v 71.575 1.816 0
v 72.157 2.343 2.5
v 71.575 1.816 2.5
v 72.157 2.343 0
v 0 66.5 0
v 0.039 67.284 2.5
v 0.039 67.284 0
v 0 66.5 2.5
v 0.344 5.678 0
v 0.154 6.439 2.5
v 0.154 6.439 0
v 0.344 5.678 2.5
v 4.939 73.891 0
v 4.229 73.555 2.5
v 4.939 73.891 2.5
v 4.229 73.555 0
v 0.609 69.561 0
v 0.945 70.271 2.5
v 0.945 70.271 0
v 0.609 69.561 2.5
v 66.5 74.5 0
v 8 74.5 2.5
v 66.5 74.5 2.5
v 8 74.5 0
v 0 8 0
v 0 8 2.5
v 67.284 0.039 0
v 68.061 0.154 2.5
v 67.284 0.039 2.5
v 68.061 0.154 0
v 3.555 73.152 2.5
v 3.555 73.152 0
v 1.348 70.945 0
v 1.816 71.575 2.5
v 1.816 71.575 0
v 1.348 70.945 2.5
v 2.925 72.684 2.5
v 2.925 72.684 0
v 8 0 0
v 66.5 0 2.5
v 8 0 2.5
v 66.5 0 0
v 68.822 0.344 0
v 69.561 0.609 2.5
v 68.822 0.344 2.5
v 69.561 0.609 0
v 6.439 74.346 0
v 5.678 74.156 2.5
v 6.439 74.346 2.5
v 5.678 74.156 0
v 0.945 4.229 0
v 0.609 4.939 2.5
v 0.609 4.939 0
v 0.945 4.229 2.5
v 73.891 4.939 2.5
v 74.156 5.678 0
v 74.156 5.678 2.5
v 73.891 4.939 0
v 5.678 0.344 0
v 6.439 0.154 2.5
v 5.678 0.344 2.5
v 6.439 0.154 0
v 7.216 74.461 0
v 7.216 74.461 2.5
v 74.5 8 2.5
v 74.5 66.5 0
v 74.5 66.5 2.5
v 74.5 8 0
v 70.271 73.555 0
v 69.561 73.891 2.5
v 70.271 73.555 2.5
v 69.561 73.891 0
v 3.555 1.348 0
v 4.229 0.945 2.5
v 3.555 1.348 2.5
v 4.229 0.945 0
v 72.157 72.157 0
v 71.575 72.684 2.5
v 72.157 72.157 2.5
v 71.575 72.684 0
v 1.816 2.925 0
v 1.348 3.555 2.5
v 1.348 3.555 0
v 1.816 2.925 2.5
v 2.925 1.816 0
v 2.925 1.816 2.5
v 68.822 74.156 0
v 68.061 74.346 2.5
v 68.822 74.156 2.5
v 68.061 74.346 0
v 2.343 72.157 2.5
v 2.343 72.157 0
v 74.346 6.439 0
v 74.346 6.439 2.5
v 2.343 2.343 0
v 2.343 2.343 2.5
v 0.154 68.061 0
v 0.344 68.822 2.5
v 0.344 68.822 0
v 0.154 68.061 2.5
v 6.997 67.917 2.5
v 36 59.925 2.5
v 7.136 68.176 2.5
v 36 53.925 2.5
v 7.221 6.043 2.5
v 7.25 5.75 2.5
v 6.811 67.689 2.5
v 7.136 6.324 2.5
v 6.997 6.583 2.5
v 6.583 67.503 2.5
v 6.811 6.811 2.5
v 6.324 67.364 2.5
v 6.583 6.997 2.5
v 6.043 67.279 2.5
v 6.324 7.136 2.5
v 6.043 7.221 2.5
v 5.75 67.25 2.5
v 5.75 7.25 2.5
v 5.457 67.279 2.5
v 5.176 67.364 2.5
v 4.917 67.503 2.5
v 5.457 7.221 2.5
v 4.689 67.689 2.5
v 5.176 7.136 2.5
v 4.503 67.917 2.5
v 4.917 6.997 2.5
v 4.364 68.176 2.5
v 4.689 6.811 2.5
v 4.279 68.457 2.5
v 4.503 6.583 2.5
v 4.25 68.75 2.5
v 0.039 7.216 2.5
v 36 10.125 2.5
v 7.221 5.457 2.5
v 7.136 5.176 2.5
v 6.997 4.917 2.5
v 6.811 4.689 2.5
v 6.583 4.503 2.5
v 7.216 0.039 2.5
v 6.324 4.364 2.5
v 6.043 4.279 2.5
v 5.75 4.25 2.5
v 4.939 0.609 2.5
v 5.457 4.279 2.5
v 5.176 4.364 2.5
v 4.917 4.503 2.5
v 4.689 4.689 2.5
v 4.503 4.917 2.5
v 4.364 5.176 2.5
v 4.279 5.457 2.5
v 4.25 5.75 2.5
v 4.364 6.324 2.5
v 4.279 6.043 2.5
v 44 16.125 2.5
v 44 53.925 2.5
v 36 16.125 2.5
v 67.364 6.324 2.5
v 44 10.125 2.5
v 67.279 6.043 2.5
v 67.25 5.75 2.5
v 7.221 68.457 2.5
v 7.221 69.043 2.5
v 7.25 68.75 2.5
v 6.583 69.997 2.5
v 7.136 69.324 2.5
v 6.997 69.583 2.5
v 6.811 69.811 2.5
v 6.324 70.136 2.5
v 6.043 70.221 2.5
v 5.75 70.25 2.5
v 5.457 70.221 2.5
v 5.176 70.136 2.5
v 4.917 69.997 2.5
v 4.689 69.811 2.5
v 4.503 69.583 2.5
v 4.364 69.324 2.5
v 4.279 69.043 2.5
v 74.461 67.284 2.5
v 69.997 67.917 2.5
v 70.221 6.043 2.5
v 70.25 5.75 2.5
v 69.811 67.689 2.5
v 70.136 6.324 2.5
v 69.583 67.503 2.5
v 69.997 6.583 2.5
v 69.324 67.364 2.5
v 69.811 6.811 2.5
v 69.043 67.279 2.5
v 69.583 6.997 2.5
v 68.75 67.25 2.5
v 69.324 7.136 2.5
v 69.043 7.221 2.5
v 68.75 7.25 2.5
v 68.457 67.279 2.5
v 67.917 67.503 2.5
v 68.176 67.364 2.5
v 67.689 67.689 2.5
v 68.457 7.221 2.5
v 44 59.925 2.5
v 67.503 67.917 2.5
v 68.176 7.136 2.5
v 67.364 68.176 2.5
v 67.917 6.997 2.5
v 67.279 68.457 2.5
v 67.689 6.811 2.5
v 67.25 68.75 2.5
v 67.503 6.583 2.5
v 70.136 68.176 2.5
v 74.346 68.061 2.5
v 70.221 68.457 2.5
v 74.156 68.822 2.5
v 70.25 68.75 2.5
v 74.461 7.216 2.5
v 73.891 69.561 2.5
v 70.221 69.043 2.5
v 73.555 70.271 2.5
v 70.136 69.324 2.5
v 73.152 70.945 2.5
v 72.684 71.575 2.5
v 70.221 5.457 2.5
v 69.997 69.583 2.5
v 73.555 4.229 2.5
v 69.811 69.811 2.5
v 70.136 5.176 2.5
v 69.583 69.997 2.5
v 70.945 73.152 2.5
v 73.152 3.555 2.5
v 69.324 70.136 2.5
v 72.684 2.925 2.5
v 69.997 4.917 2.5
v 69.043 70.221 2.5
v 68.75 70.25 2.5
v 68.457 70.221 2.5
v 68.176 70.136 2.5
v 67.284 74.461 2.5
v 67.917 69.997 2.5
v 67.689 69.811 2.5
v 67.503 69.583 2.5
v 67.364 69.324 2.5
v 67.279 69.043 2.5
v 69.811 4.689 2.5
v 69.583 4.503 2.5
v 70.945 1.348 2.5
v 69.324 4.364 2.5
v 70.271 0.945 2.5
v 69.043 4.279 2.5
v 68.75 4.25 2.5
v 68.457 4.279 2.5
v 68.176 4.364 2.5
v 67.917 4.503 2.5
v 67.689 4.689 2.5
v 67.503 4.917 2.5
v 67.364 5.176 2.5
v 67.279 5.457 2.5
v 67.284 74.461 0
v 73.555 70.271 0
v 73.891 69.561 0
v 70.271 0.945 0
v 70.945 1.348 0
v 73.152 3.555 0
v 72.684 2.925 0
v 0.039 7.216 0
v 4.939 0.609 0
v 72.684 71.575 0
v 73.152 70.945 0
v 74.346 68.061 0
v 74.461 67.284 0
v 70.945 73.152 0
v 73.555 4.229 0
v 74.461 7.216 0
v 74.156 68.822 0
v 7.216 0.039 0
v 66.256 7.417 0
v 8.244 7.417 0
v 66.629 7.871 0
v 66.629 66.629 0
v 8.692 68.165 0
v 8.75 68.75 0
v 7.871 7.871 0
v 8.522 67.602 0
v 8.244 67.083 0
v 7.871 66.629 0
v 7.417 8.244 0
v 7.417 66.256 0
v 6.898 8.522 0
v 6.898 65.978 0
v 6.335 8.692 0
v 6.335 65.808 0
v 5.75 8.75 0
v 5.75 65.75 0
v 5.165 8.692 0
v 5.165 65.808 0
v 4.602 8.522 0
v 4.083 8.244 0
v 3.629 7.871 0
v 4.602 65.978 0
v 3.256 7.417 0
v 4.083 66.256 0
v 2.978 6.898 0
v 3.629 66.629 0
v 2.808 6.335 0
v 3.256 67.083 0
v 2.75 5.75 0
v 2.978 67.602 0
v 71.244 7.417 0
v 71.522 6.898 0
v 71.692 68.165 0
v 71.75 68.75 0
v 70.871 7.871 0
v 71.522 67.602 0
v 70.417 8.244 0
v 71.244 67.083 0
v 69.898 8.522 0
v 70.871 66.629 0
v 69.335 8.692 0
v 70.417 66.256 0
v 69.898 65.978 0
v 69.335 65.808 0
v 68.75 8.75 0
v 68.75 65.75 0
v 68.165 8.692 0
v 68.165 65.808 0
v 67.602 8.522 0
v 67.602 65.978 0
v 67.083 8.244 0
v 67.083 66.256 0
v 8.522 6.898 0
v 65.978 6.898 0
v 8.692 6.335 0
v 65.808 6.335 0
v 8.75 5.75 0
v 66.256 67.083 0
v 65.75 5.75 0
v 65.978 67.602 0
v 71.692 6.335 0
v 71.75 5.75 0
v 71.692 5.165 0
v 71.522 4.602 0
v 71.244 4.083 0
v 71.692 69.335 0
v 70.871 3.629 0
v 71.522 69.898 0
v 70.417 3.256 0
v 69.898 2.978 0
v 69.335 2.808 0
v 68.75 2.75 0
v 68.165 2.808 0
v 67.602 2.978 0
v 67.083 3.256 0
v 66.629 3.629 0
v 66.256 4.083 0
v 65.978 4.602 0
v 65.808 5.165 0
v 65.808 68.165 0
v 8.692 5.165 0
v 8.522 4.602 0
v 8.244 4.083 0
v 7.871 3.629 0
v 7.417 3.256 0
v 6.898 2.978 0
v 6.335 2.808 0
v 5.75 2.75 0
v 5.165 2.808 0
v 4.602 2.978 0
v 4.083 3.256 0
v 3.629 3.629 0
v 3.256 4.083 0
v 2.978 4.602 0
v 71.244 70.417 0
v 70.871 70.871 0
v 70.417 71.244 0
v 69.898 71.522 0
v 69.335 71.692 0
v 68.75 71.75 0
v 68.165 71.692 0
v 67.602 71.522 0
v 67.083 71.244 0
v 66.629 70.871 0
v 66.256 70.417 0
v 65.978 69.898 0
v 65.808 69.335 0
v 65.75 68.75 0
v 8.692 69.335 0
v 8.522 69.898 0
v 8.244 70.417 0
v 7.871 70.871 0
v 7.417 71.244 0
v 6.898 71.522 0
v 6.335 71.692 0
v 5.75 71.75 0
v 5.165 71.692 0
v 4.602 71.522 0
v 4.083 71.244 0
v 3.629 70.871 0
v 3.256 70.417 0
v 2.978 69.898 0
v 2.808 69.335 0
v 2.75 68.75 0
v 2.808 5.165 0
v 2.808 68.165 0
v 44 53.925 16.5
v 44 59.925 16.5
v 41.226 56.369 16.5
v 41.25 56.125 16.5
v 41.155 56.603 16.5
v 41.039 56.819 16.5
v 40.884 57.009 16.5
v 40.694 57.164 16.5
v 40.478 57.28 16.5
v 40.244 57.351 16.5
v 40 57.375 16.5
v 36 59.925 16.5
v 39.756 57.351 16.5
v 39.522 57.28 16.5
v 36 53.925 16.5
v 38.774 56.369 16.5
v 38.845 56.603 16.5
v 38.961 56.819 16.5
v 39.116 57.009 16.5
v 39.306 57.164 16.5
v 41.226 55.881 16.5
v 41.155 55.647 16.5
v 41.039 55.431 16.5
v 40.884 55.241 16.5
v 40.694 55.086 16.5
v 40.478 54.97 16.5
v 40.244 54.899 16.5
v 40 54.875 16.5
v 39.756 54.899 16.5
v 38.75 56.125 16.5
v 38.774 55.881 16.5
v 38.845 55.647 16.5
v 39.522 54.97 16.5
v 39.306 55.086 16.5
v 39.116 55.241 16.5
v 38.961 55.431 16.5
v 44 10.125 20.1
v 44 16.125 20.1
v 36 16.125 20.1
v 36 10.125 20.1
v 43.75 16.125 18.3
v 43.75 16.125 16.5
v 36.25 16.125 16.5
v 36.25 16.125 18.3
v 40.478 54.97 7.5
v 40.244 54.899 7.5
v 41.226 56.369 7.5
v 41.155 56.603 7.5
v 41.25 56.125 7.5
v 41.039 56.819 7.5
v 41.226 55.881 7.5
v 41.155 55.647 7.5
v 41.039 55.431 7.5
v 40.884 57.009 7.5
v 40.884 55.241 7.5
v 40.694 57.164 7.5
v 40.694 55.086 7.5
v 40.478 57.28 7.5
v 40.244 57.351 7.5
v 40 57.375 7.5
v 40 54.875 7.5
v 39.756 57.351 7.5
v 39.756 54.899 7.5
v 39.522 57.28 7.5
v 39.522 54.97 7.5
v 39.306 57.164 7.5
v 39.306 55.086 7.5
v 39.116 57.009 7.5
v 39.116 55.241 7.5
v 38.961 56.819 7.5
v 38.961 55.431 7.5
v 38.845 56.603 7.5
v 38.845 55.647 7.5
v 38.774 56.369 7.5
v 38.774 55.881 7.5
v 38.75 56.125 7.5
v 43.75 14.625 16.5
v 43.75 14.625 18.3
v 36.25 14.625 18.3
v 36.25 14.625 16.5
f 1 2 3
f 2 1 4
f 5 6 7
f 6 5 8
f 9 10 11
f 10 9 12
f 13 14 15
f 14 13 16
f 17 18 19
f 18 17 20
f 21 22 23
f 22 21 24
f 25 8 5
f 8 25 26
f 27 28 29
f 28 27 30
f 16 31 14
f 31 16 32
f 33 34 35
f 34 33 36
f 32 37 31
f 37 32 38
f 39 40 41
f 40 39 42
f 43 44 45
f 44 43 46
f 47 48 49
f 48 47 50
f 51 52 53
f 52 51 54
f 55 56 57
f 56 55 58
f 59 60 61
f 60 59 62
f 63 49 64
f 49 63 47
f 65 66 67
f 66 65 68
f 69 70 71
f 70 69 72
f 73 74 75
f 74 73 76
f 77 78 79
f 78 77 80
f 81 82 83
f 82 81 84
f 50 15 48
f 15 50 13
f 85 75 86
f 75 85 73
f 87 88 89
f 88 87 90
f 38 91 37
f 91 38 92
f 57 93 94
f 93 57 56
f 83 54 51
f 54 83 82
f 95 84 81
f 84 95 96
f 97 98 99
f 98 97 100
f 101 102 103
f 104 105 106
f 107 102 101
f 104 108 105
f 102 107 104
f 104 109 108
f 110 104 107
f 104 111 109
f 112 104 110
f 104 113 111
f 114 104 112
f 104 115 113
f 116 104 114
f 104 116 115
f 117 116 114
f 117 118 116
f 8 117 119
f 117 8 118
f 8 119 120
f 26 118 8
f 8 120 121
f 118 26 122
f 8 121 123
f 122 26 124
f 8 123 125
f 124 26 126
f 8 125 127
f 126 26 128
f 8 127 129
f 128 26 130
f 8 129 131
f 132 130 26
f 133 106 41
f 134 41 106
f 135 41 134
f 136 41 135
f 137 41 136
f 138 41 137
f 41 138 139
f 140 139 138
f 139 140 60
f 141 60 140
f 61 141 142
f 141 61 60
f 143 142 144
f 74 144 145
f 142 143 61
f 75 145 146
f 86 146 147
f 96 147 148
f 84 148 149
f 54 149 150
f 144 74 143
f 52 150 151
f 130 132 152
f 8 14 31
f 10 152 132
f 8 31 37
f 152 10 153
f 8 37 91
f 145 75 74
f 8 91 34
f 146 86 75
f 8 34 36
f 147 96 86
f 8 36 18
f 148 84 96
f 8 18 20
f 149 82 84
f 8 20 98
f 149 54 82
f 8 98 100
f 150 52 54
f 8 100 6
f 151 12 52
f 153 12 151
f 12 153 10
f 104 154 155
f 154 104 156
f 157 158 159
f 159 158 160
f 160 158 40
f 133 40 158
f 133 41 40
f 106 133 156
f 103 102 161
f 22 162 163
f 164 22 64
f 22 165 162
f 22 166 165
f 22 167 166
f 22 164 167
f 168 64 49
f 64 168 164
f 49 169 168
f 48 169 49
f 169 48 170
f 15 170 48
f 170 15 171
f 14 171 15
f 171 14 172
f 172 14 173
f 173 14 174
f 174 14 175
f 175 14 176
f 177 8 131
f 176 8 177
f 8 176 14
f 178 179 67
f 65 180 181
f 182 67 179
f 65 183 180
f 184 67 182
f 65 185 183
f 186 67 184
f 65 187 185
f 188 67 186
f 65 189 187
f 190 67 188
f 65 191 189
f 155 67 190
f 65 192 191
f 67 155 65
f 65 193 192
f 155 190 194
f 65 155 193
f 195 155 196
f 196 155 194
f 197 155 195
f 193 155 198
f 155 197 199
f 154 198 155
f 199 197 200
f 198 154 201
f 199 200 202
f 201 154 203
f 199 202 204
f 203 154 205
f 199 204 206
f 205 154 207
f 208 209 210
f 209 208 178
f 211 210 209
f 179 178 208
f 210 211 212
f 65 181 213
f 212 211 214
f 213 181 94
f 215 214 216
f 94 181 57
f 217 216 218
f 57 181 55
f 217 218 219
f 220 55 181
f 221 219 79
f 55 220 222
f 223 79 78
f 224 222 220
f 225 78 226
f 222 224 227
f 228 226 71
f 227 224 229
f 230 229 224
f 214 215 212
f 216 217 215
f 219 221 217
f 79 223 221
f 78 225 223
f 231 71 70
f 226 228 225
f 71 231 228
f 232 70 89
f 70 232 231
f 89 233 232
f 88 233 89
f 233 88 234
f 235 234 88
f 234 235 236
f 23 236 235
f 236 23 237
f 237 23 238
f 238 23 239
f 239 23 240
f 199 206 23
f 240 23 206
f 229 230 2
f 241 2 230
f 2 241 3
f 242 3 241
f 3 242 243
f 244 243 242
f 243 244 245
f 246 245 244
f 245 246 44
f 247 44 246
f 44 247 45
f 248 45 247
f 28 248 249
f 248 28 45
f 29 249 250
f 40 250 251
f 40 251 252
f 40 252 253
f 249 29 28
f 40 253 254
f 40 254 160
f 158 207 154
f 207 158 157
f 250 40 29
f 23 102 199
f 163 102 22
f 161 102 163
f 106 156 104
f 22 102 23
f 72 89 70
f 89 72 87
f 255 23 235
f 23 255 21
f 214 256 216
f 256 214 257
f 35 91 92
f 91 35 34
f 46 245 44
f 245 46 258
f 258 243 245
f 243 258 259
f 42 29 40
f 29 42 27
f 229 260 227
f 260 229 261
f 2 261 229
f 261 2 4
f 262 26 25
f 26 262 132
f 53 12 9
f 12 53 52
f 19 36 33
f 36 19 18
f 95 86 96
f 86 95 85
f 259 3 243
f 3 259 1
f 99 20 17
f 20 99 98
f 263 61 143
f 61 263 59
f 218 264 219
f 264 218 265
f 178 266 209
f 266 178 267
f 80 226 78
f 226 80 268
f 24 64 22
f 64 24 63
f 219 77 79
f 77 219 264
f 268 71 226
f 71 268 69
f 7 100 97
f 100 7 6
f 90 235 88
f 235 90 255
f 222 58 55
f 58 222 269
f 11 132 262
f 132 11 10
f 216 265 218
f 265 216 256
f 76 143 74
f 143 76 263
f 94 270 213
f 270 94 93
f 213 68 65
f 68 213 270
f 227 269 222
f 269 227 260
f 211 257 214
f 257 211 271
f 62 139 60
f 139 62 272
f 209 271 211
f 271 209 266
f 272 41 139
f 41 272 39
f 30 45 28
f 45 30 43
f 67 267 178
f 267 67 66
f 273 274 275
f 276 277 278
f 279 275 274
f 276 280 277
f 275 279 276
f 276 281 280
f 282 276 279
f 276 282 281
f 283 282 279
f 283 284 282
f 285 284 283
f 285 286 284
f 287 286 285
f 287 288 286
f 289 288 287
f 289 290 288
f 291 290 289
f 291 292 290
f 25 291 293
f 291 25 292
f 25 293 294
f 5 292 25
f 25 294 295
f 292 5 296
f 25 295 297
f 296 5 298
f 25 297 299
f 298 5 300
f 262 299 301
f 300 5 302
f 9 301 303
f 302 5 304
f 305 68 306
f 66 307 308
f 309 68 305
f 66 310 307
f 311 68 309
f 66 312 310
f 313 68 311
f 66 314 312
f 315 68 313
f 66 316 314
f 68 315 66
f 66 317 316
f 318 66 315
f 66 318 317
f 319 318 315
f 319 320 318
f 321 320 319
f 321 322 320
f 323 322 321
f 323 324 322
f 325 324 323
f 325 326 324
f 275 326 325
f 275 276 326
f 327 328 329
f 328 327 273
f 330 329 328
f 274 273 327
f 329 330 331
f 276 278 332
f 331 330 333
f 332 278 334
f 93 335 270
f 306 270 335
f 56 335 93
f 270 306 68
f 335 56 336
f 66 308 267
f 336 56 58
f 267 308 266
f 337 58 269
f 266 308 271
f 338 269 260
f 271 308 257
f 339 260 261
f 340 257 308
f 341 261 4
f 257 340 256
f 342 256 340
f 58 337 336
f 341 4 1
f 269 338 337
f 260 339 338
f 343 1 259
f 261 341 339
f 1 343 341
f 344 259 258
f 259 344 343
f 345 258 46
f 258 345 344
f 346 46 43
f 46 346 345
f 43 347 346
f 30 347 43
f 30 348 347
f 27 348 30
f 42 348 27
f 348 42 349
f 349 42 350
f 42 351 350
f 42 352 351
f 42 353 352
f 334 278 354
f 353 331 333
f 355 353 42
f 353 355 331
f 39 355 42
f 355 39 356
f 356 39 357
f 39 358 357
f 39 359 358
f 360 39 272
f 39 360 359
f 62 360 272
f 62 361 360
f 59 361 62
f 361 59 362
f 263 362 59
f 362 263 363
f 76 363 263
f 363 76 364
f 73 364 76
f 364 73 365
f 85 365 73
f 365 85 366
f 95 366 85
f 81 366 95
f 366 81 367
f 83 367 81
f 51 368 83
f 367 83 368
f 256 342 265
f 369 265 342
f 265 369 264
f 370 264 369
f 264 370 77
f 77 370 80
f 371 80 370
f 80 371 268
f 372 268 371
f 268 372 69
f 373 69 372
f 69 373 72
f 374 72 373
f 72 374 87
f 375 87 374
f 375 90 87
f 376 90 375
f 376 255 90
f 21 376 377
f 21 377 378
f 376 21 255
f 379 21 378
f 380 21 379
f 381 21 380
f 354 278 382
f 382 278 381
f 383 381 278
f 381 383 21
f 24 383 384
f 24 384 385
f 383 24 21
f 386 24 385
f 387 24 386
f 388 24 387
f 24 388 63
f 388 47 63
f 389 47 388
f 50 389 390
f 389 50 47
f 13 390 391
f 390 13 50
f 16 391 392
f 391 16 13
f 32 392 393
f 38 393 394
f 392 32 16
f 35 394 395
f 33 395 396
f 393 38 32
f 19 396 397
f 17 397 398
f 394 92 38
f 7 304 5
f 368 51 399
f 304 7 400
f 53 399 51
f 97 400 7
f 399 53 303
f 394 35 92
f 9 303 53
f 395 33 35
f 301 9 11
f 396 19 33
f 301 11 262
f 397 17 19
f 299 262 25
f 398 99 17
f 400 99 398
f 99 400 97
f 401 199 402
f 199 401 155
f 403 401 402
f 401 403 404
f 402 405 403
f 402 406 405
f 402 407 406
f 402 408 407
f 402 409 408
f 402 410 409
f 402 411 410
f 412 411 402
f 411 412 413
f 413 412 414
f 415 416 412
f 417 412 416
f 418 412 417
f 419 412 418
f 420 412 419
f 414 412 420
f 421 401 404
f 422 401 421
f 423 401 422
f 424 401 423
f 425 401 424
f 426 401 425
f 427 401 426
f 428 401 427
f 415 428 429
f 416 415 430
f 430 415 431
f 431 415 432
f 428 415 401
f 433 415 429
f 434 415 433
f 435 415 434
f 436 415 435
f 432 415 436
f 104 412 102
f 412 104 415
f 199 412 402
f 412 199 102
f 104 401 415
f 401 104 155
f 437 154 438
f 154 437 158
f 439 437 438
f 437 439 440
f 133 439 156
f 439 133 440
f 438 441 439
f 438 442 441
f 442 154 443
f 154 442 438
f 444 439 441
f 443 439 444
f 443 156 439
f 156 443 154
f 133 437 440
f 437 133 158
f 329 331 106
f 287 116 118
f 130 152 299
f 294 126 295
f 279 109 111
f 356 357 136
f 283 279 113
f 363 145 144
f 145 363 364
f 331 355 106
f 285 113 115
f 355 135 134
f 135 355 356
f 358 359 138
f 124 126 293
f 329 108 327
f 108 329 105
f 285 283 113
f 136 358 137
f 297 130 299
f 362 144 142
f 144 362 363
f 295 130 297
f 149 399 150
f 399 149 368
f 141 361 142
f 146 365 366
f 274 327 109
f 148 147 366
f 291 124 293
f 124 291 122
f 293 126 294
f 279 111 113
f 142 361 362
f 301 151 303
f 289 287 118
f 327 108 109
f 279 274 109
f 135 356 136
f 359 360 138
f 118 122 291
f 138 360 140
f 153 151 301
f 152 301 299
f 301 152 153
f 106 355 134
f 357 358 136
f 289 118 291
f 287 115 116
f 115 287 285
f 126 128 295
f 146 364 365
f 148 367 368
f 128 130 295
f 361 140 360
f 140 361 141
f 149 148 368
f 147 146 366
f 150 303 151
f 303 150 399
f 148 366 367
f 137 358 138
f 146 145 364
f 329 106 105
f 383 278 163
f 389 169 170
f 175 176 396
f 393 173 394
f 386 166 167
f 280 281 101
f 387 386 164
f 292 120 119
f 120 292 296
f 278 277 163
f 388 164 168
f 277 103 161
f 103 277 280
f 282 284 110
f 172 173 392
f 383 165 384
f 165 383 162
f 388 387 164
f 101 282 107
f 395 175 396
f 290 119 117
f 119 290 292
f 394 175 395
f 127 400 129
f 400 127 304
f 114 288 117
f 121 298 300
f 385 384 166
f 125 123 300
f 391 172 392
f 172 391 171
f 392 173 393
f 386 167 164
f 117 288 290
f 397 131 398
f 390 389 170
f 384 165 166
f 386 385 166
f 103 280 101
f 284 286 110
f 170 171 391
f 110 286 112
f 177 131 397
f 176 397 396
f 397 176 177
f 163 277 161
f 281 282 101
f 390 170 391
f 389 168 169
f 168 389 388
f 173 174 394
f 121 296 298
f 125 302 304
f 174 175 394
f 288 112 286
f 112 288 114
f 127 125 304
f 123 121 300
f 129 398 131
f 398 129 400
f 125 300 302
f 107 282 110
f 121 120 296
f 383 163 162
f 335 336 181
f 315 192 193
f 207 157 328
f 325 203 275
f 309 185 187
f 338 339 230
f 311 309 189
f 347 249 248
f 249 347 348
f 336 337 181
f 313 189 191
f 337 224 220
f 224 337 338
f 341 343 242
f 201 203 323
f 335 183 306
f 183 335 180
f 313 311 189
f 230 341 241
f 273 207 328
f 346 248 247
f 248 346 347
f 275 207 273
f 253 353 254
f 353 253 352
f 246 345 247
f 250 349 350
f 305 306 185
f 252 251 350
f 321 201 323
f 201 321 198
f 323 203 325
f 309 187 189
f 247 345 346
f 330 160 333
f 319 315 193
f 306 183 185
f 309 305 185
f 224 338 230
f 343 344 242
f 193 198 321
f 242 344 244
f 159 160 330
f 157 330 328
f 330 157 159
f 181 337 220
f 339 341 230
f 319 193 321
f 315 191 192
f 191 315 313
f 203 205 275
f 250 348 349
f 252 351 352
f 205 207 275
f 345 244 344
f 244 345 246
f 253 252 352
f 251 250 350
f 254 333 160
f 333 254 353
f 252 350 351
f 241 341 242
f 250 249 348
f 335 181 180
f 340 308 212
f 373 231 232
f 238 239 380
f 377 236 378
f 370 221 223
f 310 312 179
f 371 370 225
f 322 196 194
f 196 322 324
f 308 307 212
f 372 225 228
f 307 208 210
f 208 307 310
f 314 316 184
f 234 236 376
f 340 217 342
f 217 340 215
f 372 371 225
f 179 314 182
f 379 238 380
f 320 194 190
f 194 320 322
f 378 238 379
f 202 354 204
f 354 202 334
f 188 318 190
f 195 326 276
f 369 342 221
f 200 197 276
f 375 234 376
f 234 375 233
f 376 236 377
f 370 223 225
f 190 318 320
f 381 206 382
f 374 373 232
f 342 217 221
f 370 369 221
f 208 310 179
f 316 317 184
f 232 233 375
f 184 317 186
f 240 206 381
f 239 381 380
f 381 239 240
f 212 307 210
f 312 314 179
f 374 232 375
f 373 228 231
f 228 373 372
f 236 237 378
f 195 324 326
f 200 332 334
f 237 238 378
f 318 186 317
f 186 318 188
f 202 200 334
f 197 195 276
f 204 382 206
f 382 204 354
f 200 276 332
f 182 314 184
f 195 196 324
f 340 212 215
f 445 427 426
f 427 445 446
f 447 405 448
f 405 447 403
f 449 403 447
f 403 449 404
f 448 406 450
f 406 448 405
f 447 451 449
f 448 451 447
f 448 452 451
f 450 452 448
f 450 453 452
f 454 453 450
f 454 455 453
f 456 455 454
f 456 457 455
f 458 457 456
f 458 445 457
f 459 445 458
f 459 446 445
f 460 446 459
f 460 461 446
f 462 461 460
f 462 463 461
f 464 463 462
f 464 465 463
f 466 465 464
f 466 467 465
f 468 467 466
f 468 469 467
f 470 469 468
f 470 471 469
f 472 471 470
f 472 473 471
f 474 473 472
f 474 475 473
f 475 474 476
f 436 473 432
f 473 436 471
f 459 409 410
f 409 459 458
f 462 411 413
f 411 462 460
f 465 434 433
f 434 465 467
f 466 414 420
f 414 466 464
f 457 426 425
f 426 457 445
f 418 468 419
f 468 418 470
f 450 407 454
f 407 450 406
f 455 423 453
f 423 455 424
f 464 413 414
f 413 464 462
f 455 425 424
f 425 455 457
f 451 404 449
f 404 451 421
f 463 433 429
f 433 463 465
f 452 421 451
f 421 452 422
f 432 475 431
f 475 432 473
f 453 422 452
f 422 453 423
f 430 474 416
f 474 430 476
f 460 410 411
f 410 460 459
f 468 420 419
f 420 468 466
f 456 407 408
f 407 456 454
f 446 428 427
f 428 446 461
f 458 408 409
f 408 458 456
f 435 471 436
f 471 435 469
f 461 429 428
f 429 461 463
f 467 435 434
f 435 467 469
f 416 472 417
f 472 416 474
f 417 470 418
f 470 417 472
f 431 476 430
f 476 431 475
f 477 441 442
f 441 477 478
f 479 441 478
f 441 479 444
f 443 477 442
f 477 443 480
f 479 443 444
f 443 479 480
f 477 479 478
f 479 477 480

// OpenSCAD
// file: dimensions.scad
wall_thickness = 2.5;

case_width = 80;
case_length = 80;
case_height = 80*1.618-80;

pcb_width = 48.5;
pcb_lenght = 45.25;
// file: rounded_cube.scad
module rounded_cube(a,b,c,r){
    hull(){
        translate([r,r,0]) cylinder(r=r, h=c, $fn=64);
        translate([a-r,r,0]) cylinder(r=r, h=c, $fn=64);
        translate([a-r,b-r,0]) cylinder(r=r, h=c, $fn=64);
        translate([r,b-r,0]) cylinder(r=r, h=c, $fn=64);
    }
}
// main file
include <rounded_cube.scad>
include <dimensions.scad>

width = case_width-2*wall_thickness-0.5;
length = case_length-2*wall_thickness-0.5;

module bottom_cover_base(){
    rounded_cube(width,length,wall_thickness,8);
    translate([(width-pcb_width)/2+27,(length-pcb_lenght)/2+41.5+0.8,14/2+wall_thickness]) cube([8,6,14],center=true);
    translate([(width-pcb_width)/2+27,(length-pcb_lenght)/2-1.5,(14+2*1.8)/2+wall_thickness]) cube([8,6,14+2*1.8],center=true);
};

module bottom_cover_cuts(){
    translate([6-0.25,6-0.25,0]) cylinder(r1=6/2,r2=3/2,h=wall_thickness,$fn=32);
    translate([6-0.25,length-6+0.25,0]) cylinder(r1=6/2,r2=3/2,h=wall_thickness,$fn=32);
    translate([width-6+0.25,6-0.25,0]) cylinder(r1=6/2,r2=3/2,h=wall_thickness,$fn=32);
    translate([width-6+0.25,length-6+0.25,0]) cylinder(r1=6/2,r2=3/2,h=wall_thickness,$fn=32);
    translate([(width-pcb_width)/2+27,(length-pcb_lenght)/2+41.5,wall_thickness+5]) cylinder(r=1.25,h=10,$fn=32);

    translate([(width-pcb_width)/2+27,(length-pcb_lenght)/2+1.5/2,14+wall_thickness+1.8/2]) cube([8-0.5,1.5,1.8],center=true);
};

module bottom_cover(){
    difference() {
        bottom_cover_base();
        bottom_cover_cuts();
    }
};

bottom_cover();
